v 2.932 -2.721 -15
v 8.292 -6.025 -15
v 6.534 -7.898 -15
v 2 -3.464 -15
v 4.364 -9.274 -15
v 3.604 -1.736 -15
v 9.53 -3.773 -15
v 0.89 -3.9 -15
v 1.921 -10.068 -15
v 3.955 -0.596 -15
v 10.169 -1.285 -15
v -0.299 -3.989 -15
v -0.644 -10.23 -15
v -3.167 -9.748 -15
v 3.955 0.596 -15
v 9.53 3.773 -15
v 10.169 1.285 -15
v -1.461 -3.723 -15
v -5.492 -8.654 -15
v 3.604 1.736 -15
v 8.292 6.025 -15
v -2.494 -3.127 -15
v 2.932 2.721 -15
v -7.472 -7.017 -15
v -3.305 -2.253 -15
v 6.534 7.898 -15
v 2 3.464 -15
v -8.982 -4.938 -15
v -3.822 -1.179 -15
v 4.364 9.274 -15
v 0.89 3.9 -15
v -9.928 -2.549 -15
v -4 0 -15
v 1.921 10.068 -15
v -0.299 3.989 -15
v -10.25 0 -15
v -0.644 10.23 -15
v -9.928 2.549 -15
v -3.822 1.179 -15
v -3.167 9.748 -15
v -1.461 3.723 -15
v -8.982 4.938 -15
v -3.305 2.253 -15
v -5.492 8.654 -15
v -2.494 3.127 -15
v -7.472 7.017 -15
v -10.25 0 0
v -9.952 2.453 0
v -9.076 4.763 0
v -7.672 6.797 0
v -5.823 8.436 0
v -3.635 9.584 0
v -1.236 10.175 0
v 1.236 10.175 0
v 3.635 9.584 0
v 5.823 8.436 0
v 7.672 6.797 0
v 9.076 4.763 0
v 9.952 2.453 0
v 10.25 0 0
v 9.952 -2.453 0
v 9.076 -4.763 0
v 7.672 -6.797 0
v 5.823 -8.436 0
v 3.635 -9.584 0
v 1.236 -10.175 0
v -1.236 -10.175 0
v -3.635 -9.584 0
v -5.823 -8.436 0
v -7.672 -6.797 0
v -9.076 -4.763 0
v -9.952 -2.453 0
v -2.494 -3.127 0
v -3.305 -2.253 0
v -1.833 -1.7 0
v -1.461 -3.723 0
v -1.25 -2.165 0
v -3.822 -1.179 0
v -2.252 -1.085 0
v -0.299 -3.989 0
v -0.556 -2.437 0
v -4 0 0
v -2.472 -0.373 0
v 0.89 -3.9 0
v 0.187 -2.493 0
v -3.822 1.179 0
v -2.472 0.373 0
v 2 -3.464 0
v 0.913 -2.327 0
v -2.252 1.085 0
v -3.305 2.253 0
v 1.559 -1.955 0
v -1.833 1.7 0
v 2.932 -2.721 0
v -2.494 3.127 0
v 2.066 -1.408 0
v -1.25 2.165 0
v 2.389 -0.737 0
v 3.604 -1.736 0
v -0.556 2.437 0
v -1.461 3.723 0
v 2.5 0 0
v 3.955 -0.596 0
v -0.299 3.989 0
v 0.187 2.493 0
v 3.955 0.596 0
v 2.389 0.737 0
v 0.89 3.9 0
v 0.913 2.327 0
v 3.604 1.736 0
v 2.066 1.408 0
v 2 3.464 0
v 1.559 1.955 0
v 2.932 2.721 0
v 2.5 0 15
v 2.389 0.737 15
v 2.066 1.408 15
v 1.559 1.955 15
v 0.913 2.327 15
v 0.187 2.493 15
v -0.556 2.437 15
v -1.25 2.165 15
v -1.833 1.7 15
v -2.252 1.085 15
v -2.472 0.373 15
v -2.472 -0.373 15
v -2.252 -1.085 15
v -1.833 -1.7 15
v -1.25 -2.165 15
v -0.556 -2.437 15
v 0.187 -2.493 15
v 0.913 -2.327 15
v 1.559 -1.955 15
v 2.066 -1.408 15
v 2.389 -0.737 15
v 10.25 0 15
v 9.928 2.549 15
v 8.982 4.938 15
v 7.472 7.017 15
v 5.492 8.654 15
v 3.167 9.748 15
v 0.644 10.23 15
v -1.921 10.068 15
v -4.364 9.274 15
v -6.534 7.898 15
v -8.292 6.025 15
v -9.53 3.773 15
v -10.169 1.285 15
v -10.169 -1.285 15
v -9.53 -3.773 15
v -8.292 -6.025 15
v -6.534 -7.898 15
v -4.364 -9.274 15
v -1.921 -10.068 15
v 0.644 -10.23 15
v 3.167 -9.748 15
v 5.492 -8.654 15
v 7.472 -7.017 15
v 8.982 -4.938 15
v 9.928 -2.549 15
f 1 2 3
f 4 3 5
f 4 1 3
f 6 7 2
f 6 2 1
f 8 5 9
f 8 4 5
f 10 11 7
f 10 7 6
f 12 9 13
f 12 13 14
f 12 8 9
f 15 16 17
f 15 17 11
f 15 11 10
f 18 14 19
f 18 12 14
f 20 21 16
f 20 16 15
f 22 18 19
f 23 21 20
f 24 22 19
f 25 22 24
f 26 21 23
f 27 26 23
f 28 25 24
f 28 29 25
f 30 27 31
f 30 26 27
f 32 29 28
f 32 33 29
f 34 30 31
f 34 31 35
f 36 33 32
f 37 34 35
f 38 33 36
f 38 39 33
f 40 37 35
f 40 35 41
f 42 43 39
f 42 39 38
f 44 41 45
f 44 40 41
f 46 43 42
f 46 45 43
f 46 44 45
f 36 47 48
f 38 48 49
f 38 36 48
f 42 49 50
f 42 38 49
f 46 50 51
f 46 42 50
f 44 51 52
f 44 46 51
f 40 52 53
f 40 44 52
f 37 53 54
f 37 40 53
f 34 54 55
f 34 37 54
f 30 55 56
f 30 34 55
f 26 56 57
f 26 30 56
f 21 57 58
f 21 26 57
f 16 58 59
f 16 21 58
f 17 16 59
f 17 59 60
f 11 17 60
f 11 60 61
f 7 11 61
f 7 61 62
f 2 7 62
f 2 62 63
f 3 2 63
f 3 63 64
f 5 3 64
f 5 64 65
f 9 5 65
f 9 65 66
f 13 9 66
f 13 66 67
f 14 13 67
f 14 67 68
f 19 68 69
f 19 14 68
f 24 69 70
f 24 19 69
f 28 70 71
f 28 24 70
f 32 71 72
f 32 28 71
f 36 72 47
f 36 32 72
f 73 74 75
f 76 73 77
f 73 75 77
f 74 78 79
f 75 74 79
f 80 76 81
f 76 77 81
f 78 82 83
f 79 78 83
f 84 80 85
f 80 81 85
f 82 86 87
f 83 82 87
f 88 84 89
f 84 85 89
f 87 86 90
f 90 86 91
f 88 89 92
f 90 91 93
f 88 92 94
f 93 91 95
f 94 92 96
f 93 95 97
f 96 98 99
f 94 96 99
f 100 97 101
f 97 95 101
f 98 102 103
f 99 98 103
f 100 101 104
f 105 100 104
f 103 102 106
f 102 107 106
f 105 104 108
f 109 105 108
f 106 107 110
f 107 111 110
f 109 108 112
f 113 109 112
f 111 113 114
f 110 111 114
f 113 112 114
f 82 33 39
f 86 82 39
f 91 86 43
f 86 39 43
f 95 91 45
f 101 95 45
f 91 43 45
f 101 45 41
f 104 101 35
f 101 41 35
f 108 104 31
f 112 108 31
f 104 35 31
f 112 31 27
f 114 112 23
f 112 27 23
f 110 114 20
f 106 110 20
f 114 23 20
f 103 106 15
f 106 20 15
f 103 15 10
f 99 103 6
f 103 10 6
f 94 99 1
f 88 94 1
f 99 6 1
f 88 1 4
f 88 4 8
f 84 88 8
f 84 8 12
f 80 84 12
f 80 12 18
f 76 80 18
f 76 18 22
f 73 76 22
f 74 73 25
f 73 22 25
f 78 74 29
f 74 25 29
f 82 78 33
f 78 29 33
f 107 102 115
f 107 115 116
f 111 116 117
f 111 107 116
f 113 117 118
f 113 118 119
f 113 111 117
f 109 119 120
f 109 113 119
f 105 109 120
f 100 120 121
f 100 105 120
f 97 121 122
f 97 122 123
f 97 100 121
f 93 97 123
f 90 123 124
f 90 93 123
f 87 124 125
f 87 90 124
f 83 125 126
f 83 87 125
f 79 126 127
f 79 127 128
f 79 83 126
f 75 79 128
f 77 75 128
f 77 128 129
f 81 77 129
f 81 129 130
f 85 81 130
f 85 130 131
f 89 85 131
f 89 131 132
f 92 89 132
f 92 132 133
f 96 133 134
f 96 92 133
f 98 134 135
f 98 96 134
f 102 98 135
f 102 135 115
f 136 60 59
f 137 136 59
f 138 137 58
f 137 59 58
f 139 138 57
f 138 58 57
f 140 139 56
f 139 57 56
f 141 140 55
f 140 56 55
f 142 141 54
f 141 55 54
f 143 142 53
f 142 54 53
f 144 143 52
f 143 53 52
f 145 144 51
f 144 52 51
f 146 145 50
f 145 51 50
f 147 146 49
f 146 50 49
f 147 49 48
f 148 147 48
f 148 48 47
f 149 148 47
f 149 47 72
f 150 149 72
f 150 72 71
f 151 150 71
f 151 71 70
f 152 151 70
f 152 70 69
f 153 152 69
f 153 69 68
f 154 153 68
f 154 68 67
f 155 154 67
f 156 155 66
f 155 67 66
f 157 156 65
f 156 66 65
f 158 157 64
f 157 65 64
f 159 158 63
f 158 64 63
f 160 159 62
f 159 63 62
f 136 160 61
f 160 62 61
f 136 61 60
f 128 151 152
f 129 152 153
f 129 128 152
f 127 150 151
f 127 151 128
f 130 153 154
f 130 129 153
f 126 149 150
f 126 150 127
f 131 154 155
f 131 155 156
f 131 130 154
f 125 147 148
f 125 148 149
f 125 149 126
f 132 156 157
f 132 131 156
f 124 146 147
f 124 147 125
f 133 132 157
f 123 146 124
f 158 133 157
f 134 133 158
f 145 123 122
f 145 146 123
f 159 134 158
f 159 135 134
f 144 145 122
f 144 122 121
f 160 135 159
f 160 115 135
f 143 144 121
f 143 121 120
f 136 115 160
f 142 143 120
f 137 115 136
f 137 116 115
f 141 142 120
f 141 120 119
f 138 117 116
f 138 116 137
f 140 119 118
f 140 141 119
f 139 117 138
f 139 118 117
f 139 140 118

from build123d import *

# Parameters (mm, degrees)
CROQUIS1_R              = 10.25
CROQUIS1_R_2            = 2.5
SALIENTE_EXTRUIR1_DEPTH = 15
SALIENTE_EXTRUIR2_START = 15
CROQUIS2_R              = 10.25
CROQUIS2_R_2            = 4
SALIENTE_EXTRUIR2_DEPTH = 15


with BuildPart() as part:
    # Croquis1 → Saliente-Extruir1 (new body)
    with BuildSketch(Plane.XY):
        Circle(CROQUIS1_R)
        Circle(CROQUIS1_R_2, mode=Mode.SUBTRACT)
    extrude(amount=SALIENTE_EXTRUIR1_DEPTH)

    # Croquis2 → Saliente-Extruir2 (add)
    with BuildSketch(Plane(origin=(0, 0, 0), x_dir=(-1, 0, 0), z_dir=(0, 0, -1)).offset(SALIENTE_EXTRUIR2_START)):
        Circle(CROQUIS2_R)
        Circle(CROQUIS2_R_2, mode=Mode.SUBTRACT)
    extrude(amount=-SALIENTE_EXTRUIR2_DEPTH)


solid = part.part
